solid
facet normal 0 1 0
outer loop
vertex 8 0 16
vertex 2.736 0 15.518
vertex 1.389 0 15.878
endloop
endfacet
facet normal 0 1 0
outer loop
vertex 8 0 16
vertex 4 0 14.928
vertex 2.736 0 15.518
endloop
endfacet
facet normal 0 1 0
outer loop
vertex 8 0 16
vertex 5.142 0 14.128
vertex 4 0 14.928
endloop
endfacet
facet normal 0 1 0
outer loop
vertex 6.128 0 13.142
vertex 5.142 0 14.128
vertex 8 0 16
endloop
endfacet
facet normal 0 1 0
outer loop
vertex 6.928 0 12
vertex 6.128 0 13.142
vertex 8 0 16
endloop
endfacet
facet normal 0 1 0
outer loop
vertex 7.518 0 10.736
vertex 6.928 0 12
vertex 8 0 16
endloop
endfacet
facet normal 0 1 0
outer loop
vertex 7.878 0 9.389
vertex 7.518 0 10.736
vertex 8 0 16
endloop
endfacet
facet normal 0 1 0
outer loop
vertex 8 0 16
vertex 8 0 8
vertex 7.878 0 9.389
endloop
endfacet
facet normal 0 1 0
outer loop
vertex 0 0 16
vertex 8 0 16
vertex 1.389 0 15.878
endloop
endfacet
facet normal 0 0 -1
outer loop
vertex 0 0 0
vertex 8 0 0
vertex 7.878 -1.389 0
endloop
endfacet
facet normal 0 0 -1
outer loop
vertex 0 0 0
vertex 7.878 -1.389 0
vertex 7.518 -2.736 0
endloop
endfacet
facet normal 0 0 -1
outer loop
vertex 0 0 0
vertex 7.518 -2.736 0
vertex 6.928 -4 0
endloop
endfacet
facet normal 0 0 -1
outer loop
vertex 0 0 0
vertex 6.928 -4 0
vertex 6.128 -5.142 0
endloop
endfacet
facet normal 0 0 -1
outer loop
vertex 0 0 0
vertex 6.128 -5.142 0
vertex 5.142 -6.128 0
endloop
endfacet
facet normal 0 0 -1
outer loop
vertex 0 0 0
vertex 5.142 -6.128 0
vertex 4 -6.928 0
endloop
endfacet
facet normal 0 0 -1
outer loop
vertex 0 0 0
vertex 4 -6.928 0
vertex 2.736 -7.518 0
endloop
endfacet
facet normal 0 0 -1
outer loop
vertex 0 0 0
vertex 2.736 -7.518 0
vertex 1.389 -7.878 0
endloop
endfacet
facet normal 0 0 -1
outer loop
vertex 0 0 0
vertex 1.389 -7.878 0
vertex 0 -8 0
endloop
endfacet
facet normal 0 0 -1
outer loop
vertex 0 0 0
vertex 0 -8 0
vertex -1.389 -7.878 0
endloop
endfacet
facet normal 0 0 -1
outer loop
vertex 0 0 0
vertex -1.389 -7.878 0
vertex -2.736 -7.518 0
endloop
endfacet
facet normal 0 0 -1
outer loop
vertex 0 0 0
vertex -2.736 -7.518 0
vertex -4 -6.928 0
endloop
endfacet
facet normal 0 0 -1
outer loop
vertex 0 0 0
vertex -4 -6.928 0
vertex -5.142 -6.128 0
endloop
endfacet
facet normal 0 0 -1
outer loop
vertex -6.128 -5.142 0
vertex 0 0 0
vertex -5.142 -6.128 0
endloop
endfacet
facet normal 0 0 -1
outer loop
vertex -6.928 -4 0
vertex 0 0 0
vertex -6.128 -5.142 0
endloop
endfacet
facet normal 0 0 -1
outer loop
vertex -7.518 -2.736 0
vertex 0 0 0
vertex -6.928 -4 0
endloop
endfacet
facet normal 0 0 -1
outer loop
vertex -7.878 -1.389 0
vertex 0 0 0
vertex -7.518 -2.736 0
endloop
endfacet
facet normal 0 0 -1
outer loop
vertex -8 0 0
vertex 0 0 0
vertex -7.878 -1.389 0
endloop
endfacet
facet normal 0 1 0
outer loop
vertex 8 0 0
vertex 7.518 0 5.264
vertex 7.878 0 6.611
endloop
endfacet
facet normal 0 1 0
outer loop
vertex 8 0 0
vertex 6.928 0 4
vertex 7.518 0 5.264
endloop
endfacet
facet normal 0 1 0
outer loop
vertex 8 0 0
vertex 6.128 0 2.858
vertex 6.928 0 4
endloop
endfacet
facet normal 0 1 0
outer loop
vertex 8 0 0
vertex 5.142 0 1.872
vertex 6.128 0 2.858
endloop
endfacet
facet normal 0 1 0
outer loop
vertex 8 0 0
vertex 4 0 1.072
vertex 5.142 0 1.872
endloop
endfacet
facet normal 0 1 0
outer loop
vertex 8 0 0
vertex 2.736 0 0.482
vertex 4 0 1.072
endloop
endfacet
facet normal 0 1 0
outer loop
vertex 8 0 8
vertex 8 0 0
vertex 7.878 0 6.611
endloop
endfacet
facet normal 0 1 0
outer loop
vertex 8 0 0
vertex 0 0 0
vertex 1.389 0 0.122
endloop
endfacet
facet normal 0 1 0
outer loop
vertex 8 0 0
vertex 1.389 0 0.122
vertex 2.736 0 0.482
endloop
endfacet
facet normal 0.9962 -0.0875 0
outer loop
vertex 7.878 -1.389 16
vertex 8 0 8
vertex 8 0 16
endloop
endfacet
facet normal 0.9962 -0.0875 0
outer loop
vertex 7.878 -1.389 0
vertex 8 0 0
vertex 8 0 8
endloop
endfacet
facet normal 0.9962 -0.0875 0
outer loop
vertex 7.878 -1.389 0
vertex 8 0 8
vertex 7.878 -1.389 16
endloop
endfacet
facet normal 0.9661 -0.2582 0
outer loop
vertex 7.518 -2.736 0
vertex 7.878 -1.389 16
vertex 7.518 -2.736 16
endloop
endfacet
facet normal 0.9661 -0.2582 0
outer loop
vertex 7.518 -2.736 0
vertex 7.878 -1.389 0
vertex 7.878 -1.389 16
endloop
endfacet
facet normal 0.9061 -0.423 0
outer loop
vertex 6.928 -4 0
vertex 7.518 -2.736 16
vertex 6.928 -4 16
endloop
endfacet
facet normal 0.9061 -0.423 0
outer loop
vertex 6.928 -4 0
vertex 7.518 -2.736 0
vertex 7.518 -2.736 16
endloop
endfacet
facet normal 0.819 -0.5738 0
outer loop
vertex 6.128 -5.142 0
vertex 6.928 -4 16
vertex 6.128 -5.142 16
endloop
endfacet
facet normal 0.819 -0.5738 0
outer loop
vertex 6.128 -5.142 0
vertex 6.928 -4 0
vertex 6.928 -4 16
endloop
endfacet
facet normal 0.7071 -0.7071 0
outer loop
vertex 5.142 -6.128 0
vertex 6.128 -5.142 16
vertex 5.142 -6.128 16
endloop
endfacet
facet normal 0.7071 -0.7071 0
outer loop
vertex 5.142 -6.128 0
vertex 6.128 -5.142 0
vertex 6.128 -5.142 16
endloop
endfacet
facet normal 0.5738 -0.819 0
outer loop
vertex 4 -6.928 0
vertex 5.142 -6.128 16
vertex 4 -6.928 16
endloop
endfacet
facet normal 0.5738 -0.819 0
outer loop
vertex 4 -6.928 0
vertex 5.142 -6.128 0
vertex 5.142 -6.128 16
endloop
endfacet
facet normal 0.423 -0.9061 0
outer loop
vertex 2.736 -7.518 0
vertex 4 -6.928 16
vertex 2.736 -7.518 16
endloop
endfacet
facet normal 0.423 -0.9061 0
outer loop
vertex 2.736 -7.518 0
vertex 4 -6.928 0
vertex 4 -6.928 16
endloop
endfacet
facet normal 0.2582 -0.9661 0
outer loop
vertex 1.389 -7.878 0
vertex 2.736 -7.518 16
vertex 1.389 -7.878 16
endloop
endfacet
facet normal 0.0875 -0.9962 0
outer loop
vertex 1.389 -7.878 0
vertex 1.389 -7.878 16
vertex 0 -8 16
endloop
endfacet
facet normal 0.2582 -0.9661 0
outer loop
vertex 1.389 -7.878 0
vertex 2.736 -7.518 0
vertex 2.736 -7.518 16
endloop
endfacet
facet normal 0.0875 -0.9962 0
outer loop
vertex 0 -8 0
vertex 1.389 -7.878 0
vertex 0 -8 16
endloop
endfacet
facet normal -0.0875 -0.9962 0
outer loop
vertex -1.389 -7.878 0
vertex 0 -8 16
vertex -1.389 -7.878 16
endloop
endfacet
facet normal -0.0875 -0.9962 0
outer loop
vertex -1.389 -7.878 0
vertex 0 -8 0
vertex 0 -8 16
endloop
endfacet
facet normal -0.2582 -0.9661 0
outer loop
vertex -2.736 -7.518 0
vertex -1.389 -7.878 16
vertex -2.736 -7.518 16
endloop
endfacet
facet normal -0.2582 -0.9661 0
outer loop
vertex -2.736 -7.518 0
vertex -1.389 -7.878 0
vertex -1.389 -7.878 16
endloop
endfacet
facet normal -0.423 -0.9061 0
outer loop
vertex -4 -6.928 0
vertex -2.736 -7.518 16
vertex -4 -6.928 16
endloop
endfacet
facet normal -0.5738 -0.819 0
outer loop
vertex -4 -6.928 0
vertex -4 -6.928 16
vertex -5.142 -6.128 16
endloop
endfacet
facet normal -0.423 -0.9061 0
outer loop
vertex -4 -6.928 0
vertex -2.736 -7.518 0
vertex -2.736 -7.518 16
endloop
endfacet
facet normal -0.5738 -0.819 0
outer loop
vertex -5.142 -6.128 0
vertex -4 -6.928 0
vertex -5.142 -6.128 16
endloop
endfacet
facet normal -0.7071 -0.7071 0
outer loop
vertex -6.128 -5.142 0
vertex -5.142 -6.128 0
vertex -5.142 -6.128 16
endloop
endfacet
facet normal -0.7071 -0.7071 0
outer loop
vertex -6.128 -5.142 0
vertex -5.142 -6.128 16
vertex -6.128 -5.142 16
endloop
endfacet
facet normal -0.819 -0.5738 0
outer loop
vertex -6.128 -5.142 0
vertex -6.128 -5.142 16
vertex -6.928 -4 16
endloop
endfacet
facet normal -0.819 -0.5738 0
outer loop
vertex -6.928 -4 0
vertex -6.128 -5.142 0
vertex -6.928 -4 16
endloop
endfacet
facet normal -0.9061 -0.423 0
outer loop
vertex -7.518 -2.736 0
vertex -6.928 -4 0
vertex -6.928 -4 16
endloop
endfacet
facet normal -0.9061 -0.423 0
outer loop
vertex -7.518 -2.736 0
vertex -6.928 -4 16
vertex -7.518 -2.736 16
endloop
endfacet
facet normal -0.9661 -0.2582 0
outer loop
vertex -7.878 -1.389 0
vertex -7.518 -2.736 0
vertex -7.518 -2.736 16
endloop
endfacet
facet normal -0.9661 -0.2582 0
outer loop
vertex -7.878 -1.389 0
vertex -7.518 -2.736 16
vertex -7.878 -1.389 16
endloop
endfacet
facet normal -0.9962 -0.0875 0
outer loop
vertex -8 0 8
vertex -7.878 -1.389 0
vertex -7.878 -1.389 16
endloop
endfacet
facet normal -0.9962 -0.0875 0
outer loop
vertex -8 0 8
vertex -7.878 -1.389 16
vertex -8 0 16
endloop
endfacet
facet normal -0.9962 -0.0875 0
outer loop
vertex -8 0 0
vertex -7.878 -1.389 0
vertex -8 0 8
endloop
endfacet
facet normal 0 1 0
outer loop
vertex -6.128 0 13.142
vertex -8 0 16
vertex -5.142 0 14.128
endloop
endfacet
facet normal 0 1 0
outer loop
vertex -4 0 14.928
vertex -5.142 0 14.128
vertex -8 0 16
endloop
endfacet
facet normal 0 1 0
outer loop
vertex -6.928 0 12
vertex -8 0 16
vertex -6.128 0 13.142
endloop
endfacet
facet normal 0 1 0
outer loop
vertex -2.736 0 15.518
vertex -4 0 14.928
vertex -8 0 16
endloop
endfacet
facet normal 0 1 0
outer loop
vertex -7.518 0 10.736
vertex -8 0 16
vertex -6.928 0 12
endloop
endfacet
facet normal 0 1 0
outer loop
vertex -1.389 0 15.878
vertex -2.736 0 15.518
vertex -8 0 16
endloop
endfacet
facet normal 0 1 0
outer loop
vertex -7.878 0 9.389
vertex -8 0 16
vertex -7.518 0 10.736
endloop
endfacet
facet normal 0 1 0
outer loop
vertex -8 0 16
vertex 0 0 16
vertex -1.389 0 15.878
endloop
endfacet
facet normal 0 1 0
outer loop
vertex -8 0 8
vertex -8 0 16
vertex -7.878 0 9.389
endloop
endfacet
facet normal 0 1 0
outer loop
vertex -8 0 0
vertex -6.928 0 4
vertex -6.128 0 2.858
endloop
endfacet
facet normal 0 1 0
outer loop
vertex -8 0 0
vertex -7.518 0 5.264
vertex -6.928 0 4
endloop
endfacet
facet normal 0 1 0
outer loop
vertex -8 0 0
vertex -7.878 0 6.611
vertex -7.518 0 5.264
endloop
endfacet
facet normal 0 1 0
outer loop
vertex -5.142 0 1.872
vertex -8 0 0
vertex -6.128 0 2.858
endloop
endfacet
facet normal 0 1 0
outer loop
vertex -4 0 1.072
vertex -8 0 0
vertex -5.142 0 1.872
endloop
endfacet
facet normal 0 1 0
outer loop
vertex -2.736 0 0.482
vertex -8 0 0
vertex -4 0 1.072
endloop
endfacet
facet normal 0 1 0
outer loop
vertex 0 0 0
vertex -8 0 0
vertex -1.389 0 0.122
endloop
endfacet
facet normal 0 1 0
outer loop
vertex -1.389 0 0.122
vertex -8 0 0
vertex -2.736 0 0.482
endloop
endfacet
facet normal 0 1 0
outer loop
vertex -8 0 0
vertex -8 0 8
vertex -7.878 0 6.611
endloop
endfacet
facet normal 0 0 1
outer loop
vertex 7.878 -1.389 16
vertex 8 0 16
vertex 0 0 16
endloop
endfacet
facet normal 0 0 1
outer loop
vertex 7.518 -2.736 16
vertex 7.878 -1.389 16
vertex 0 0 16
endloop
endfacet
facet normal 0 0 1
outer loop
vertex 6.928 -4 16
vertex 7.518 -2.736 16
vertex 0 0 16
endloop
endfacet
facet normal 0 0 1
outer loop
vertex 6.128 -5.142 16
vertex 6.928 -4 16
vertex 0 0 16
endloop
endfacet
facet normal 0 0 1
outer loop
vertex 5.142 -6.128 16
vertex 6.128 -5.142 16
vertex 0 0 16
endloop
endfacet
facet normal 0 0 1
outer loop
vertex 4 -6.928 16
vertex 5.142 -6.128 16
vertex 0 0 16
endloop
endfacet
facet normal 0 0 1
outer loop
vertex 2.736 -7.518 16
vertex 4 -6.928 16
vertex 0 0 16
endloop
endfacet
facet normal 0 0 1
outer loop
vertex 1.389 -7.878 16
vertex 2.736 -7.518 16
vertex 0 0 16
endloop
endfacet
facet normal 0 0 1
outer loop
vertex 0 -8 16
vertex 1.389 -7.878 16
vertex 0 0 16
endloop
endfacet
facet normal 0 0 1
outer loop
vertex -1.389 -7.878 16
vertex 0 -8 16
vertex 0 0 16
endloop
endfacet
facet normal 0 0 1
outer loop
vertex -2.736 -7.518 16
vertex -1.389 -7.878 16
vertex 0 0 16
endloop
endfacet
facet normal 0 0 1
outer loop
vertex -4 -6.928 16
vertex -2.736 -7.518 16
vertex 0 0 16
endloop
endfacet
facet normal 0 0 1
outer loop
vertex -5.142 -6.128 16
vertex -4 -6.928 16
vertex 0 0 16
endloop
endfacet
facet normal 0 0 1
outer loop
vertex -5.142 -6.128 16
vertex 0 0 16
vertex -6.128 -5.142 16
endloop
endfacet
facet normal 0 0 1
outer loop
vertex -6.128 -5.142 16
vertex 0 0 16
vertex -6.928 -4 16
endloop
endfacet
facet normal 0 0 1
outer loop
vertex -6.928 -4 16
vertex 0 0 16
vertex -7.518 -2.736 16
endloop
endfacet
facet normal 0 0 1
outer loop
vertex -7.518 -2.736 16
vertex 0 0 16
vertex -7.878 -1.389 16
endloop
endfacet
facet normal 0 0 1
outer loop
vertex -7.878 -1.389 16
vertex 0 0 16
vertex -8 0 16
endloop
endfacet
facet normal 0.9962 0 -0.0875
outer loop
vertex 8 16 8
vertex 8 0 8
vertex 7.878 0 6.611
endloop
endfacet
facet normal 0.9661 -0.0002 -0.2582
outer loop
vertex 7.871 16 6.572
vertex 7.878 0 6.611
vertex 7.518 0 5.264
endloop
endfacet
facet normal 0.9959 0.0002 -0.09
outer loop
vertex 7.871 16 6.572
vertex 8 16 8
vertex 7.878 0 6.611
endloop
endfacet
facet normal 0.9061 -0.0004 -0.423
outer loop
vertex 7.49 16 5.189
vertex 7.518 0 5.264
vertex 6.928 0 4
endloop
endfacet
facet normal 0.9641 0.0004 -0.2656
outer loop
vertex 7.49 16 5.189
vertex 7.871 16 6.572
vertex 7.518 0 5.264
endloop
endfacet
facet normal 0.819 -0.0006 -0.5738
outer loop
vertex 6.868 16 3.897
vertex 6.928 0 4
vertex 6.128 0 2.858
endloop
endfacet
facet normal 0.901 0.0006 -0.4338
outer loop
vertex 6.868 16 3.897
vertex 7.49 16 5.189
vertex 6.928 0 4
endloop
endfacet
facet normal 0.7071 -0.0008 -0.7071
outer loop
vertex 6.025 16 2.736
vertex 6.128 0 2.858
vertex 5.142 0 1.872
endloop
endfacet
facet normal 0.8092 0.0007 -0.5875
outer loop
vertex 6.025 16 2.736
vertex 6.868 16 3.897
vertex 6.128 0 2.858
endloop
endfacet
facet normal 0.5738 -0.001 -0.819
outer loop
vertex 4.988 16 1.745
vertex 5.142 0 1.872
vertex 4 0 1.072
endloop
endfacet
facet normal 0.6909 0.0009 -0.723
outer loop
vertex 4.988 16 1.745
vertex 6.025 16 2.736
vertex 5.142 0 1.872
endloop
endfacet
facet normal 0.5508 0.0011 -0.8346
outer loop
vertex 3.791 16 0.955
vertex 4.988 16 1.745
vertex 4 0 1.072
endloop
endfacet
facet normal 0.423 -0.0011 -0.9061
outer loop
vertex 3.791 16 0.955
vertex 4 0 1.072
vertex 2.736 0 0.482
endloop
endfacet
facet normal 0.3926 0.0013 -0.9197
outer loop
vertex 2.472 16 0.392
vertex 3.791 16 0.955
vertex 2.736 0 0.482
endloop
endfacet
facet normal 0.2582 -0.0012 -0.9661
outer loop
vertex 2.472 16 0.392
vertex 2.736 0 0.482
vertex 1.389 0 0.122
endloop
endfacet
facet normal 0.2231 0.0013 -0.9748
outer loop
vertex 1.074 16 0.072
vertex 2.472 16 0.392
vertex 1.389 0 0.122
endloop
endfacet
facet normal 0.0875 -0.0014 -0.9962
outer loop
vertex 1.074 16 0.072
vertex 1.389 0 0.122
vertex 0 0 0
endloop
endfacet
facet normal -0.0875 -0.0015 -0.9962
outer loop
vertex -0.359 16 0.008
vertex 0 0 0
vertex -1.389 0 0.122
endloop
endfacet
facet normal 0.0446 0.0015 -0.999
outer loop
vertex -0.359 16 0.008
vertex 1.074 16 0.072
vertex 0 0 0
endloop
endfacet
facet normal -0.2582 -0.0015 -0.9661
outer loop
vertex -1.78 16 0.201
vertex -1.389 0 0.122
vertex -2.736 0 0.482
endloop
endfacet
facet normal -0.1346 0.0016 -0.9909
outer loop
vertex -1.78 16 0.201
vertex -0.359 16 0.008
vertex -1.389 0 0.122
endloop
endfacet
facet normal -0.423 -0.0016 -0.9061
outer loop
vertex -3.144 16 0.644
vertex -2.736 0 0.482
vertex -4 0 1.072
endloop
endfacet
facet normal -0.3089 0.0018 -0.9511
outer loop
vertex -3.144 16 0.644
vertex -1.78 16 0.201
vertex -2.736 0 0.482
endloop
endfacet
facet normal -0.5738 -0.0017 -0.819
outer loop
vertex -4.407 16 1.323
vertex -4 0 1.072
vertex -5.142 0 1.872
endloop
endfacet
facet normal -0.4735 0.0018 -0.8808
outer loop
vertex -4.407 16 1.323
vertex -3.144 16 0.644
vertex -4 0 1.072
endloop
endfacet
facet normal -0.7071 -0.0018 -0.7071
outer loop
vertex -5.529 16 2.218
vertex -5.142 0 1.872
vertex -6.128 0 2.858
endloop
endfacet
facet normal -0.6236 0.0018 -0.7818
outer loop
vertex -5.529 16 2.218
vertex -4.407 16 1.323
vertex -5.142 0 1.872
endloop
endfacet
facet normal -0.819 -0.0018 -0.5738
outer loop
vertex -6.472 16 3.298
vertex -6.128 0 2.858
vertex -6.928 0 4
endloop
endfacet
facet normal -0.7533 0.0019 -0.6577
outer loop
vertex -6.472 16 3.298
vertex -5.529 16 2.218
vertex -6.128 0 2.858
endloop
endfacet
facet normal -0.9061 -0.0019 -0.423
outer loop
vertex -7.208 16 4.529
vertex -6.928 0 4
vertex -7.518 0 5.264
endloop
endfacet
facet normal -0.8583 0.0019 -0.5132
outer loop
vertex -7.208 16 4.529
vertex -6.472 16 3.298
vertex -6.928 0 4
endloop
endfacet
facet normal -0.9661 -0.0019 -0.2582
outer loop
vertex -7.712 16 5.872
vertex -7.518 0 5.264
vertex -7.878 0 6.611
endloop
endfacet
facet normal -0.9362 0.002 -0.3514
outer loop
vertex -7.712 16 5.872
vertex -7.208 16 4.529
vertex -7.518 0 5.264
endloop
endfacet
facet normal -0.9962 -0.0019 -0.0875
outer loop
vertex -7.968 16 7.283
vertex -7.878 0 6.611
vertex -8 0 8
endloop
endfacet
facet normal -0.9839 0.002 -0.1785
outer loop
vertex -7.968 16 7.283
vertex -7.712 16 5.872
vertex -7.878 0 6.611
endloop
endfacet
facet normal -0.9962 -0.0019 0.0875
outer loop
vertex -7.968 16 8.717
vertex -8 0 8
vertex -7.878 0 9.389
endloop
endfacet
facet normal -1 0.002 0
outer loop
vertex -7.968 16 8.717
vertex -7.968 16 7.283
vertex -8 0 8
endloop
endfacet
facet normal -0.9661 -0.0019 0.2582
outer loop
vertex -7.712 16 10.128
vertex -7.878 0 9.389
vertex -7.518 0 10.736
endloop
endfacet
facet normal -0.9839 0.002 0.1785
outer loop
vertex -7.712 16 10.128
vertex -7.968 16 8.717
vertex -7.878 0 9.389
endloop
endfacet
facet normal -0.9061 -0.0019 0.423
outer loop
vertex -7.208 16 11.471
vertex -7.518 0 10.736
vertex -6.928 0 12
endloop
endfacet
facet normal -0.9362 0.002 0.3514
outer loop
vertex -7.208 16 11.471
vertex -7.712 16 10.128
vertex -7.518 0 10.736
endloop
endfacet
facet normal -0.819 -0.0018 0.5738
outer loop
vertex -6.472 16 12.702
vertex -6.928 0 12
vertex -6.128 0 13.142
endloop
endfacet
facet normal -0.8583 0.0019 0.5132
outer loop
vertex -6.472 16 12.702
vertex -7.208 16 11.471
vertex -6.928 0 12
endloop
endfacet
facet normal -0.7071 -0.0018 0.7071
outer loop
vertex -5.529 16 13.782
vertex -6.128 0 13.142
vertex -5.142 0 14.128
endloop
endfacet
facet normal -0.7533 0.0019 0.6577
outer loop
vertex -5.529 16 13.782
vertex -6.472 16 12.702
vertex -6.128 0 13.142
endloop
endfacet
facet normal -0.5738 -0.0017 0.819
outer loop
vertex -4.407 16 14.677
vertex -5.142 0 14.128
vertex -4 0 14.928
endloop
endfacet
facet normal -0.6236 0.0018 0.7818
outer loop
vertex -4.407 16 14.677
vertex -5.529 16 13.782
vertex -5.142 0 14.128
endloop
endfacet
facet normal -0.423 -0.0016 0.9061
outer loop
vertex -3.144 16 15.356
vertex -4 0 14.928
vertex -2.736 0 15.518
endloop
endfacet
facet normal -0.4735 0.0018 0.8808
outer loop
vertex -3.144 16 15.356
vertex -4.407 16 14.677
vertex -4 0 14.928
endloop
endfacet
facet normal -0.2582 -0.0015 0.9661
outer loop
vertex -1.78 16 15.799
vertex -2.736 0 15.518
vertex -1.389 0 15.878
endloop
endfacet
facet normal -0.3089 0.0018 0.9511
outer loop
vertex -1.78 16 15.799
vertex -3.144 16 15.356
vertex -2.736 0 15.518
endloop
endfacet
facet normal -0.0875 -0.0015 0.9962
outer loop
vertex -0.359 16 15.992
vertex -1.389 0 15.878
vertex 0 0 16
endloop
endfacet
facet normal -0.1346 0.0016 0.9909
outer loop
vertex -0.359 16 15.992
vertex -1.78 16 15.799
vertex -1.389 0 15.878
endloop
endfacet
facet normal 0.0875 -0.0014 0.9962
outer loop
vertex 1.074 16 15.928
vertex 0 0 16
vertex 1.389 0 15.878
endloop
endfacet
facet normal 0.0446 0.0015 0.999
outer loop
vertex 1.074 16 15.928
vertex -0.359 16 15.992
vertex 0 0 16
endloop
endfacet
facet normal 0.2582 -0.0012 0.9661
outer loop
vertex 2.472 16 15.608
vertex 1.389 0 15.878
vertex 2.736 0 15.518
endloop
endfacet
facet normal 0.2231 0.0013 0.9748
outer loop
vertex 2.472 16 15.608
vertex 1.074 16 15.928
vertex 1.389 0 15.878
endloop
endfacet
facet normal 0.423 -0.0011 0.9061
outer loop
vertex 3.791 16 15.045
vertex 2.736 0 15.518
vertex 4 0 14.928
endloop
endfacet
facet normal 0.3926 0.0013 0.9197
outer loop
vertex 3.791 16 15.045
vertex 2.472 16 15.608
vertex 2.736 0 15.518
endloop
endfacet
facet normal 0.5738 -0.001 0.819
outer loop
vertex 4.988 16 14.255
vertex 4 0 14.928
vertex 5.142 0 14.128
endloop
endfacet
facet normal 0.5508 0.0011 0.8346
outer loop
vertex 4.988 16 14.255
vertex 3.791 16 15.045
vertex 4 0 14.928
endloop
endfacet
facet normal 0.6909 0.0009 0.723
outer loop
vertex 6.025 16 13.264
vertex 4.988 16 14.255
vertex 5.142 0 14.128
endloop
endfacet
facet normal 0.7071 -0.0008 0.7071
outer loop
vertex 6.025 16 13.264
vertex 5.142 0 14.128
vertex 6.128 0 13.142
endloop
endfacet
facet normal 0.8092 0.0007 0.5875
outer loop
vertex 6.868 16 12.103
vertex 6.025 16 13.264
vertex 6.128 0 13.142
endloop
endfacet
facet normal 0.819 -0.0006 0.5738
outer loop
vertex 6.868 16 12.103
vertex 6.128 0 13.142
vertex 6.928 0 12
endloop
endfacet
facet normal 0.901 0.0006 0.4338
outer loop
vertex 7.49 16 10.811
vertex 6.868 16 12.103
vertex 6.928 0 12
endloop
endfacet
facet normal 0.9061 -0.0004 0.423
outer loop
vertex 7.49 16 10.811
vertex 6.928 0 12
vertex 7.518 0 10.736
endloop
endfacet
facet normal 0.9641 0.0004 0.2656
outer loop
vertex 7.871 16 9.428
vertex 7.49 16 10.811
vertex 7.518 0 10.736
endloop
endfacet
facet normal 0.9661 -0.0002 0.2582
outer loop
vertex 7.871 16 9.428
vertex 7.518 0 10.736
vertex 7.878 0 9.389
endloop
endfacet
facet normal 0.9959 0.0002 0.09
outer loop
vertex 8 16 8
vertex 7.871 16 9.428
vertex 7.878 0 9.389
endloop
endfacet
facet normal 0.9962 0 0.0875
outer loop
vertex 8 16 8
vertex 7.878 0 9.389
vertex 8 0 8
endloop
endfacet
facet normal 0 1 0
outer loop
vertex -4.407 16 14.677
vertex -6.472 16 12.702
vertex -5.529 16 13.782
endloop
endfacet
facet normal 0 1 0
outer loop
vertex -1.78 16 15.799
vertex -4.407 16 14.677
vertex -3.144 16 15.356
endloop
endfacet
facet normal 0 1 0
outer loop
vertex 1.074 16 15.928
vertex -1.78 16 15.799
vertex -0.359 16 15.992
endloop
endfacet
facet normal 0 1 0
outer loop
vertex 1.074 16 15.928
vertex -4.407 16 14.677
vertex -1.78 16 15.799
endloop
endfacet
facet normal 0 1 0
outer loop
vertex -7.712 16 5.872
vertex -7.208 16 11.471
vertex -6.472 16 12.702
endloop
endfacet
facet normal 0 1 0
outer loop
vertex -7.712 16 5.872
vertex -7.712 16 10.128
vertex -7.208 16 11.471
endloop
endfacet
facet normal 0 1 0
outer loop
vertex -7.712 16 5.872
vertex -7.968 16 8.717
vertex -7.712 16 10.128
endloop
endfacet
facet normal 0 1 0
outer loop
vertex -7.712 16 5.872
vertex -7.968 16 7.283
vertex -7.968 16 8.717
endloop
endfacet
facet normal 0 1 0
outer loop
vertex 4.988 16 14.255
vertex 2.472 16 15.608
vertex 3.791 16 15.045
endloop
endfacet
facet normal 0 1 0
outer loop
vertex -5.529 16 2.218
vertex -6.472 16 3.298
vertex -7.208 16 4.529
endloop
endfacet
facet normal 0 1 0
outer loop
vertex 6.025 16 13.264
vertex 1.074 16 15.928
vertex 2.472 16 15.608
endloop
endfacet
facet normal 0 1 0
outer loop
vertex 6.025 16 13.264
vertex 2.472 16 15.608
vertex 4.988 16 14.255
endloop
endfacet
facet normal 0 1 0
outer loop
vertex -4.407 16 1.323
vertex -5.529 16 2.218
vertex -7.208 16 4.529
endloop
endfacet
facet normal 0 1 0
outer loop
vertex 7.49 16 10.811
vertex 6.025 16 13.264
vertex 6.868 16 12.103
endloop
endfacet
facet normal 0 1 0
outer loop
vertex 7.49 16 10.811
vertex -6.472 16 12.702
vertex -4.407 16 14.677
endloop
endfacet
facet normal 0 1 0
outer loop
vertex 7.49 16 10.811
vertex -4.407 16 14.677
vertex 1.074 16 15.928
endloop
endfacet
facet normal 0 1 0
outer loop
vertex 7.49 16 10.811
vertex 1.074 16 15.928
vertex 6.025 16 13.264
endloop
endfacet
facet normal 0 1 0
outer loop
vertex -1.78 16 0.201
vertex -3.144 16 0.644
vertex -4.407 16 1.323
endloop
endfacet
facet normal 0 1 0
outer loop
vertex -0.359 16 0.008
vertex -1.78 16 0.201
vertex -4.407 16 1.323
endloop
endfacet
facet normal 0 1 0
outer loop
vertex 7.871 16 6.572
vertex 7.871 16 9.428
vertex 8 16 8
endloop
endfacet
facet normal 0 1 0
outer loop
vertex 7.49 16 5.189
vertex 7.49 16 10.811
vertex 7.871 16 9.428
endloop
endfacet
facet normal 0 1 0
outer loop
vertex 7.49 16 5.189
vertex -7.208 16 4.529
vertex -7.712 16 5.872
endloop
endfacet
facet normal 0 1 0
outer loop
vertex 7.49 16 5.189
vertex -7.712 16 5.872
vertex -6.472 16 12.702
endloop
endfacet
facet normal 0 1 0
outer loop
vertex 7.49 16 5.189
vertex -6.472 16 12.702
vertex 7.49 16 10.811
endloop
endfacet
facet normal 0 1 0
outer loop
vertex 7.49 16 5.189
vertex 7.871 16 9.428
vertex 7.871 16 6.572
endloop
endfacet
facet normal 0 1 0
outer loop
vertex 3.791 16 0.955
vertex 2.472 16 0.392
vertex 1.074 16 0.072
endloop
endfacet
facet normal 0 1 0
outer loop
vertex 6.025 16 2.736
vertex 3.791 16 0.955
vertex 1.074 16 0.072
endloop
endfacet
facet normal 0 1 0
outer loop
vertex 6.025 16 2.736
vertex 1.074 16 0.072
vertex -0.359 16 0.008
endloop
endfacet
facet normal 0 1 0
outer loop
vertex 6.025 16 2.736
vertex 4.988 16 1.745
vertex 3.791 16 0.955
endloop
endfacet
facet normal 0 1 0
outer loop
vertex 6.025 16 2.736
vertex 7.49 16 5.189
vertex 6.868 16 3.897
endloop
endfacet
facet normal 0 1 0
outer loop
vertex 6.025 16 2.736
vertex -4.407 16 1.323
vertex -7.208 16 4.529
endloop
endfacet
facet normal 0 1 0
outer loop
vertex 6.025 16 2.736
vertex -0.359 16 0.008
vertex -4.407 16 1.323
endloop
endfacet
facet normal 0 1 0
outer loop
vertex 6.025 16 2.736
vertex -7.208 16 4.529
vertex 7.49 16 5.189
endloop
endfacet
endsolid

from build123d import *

# Parameters (mm, degrees)
EXTRUDE_1_DEPTH     = 16
SKETCH_2_W          = 18.798290213
SKETCH_2_H          = 18.208539932
SKETCH_2_R          = 8
CUT_EXTRUDE_1_DEPTH = 16


with BuildPart() as part:
    # 草图1 → 凸台-拉伸1 (new body)
    with BuildSketch(Plane.XY):
        with BuildLine():
            Line((-8, 0), (-8, 16))
            Line((-8, 16), (8, 16))
            Line((8, 16), (8, 0))
            ThreePointArc((8, 0), (0, -8), (-8, 0))
        make_face()
    extrude(amount=EXTRUDE_1_DEPTH)

    # 草图2 → 切除-拉伸1 (cut)
    with BuildSketch(Plane(origin=(0, 16, 0), x_dir=(1, 0, 0), z_dir=(0, 1, 0))):
        with Locations((-0.294875141, -7.797273341)):
            Rectangle(SKETCH_2_W, SKETCH_2_H)
        with Locations((0, -8)):
            Circle(SKETCH_2_R, mode=Mode.SUBTRACT)
    extrude(amount=-CUT_EXTRUDE_1_DEPTH, mode=Mode.SUBTRACT)


solid = part.part
